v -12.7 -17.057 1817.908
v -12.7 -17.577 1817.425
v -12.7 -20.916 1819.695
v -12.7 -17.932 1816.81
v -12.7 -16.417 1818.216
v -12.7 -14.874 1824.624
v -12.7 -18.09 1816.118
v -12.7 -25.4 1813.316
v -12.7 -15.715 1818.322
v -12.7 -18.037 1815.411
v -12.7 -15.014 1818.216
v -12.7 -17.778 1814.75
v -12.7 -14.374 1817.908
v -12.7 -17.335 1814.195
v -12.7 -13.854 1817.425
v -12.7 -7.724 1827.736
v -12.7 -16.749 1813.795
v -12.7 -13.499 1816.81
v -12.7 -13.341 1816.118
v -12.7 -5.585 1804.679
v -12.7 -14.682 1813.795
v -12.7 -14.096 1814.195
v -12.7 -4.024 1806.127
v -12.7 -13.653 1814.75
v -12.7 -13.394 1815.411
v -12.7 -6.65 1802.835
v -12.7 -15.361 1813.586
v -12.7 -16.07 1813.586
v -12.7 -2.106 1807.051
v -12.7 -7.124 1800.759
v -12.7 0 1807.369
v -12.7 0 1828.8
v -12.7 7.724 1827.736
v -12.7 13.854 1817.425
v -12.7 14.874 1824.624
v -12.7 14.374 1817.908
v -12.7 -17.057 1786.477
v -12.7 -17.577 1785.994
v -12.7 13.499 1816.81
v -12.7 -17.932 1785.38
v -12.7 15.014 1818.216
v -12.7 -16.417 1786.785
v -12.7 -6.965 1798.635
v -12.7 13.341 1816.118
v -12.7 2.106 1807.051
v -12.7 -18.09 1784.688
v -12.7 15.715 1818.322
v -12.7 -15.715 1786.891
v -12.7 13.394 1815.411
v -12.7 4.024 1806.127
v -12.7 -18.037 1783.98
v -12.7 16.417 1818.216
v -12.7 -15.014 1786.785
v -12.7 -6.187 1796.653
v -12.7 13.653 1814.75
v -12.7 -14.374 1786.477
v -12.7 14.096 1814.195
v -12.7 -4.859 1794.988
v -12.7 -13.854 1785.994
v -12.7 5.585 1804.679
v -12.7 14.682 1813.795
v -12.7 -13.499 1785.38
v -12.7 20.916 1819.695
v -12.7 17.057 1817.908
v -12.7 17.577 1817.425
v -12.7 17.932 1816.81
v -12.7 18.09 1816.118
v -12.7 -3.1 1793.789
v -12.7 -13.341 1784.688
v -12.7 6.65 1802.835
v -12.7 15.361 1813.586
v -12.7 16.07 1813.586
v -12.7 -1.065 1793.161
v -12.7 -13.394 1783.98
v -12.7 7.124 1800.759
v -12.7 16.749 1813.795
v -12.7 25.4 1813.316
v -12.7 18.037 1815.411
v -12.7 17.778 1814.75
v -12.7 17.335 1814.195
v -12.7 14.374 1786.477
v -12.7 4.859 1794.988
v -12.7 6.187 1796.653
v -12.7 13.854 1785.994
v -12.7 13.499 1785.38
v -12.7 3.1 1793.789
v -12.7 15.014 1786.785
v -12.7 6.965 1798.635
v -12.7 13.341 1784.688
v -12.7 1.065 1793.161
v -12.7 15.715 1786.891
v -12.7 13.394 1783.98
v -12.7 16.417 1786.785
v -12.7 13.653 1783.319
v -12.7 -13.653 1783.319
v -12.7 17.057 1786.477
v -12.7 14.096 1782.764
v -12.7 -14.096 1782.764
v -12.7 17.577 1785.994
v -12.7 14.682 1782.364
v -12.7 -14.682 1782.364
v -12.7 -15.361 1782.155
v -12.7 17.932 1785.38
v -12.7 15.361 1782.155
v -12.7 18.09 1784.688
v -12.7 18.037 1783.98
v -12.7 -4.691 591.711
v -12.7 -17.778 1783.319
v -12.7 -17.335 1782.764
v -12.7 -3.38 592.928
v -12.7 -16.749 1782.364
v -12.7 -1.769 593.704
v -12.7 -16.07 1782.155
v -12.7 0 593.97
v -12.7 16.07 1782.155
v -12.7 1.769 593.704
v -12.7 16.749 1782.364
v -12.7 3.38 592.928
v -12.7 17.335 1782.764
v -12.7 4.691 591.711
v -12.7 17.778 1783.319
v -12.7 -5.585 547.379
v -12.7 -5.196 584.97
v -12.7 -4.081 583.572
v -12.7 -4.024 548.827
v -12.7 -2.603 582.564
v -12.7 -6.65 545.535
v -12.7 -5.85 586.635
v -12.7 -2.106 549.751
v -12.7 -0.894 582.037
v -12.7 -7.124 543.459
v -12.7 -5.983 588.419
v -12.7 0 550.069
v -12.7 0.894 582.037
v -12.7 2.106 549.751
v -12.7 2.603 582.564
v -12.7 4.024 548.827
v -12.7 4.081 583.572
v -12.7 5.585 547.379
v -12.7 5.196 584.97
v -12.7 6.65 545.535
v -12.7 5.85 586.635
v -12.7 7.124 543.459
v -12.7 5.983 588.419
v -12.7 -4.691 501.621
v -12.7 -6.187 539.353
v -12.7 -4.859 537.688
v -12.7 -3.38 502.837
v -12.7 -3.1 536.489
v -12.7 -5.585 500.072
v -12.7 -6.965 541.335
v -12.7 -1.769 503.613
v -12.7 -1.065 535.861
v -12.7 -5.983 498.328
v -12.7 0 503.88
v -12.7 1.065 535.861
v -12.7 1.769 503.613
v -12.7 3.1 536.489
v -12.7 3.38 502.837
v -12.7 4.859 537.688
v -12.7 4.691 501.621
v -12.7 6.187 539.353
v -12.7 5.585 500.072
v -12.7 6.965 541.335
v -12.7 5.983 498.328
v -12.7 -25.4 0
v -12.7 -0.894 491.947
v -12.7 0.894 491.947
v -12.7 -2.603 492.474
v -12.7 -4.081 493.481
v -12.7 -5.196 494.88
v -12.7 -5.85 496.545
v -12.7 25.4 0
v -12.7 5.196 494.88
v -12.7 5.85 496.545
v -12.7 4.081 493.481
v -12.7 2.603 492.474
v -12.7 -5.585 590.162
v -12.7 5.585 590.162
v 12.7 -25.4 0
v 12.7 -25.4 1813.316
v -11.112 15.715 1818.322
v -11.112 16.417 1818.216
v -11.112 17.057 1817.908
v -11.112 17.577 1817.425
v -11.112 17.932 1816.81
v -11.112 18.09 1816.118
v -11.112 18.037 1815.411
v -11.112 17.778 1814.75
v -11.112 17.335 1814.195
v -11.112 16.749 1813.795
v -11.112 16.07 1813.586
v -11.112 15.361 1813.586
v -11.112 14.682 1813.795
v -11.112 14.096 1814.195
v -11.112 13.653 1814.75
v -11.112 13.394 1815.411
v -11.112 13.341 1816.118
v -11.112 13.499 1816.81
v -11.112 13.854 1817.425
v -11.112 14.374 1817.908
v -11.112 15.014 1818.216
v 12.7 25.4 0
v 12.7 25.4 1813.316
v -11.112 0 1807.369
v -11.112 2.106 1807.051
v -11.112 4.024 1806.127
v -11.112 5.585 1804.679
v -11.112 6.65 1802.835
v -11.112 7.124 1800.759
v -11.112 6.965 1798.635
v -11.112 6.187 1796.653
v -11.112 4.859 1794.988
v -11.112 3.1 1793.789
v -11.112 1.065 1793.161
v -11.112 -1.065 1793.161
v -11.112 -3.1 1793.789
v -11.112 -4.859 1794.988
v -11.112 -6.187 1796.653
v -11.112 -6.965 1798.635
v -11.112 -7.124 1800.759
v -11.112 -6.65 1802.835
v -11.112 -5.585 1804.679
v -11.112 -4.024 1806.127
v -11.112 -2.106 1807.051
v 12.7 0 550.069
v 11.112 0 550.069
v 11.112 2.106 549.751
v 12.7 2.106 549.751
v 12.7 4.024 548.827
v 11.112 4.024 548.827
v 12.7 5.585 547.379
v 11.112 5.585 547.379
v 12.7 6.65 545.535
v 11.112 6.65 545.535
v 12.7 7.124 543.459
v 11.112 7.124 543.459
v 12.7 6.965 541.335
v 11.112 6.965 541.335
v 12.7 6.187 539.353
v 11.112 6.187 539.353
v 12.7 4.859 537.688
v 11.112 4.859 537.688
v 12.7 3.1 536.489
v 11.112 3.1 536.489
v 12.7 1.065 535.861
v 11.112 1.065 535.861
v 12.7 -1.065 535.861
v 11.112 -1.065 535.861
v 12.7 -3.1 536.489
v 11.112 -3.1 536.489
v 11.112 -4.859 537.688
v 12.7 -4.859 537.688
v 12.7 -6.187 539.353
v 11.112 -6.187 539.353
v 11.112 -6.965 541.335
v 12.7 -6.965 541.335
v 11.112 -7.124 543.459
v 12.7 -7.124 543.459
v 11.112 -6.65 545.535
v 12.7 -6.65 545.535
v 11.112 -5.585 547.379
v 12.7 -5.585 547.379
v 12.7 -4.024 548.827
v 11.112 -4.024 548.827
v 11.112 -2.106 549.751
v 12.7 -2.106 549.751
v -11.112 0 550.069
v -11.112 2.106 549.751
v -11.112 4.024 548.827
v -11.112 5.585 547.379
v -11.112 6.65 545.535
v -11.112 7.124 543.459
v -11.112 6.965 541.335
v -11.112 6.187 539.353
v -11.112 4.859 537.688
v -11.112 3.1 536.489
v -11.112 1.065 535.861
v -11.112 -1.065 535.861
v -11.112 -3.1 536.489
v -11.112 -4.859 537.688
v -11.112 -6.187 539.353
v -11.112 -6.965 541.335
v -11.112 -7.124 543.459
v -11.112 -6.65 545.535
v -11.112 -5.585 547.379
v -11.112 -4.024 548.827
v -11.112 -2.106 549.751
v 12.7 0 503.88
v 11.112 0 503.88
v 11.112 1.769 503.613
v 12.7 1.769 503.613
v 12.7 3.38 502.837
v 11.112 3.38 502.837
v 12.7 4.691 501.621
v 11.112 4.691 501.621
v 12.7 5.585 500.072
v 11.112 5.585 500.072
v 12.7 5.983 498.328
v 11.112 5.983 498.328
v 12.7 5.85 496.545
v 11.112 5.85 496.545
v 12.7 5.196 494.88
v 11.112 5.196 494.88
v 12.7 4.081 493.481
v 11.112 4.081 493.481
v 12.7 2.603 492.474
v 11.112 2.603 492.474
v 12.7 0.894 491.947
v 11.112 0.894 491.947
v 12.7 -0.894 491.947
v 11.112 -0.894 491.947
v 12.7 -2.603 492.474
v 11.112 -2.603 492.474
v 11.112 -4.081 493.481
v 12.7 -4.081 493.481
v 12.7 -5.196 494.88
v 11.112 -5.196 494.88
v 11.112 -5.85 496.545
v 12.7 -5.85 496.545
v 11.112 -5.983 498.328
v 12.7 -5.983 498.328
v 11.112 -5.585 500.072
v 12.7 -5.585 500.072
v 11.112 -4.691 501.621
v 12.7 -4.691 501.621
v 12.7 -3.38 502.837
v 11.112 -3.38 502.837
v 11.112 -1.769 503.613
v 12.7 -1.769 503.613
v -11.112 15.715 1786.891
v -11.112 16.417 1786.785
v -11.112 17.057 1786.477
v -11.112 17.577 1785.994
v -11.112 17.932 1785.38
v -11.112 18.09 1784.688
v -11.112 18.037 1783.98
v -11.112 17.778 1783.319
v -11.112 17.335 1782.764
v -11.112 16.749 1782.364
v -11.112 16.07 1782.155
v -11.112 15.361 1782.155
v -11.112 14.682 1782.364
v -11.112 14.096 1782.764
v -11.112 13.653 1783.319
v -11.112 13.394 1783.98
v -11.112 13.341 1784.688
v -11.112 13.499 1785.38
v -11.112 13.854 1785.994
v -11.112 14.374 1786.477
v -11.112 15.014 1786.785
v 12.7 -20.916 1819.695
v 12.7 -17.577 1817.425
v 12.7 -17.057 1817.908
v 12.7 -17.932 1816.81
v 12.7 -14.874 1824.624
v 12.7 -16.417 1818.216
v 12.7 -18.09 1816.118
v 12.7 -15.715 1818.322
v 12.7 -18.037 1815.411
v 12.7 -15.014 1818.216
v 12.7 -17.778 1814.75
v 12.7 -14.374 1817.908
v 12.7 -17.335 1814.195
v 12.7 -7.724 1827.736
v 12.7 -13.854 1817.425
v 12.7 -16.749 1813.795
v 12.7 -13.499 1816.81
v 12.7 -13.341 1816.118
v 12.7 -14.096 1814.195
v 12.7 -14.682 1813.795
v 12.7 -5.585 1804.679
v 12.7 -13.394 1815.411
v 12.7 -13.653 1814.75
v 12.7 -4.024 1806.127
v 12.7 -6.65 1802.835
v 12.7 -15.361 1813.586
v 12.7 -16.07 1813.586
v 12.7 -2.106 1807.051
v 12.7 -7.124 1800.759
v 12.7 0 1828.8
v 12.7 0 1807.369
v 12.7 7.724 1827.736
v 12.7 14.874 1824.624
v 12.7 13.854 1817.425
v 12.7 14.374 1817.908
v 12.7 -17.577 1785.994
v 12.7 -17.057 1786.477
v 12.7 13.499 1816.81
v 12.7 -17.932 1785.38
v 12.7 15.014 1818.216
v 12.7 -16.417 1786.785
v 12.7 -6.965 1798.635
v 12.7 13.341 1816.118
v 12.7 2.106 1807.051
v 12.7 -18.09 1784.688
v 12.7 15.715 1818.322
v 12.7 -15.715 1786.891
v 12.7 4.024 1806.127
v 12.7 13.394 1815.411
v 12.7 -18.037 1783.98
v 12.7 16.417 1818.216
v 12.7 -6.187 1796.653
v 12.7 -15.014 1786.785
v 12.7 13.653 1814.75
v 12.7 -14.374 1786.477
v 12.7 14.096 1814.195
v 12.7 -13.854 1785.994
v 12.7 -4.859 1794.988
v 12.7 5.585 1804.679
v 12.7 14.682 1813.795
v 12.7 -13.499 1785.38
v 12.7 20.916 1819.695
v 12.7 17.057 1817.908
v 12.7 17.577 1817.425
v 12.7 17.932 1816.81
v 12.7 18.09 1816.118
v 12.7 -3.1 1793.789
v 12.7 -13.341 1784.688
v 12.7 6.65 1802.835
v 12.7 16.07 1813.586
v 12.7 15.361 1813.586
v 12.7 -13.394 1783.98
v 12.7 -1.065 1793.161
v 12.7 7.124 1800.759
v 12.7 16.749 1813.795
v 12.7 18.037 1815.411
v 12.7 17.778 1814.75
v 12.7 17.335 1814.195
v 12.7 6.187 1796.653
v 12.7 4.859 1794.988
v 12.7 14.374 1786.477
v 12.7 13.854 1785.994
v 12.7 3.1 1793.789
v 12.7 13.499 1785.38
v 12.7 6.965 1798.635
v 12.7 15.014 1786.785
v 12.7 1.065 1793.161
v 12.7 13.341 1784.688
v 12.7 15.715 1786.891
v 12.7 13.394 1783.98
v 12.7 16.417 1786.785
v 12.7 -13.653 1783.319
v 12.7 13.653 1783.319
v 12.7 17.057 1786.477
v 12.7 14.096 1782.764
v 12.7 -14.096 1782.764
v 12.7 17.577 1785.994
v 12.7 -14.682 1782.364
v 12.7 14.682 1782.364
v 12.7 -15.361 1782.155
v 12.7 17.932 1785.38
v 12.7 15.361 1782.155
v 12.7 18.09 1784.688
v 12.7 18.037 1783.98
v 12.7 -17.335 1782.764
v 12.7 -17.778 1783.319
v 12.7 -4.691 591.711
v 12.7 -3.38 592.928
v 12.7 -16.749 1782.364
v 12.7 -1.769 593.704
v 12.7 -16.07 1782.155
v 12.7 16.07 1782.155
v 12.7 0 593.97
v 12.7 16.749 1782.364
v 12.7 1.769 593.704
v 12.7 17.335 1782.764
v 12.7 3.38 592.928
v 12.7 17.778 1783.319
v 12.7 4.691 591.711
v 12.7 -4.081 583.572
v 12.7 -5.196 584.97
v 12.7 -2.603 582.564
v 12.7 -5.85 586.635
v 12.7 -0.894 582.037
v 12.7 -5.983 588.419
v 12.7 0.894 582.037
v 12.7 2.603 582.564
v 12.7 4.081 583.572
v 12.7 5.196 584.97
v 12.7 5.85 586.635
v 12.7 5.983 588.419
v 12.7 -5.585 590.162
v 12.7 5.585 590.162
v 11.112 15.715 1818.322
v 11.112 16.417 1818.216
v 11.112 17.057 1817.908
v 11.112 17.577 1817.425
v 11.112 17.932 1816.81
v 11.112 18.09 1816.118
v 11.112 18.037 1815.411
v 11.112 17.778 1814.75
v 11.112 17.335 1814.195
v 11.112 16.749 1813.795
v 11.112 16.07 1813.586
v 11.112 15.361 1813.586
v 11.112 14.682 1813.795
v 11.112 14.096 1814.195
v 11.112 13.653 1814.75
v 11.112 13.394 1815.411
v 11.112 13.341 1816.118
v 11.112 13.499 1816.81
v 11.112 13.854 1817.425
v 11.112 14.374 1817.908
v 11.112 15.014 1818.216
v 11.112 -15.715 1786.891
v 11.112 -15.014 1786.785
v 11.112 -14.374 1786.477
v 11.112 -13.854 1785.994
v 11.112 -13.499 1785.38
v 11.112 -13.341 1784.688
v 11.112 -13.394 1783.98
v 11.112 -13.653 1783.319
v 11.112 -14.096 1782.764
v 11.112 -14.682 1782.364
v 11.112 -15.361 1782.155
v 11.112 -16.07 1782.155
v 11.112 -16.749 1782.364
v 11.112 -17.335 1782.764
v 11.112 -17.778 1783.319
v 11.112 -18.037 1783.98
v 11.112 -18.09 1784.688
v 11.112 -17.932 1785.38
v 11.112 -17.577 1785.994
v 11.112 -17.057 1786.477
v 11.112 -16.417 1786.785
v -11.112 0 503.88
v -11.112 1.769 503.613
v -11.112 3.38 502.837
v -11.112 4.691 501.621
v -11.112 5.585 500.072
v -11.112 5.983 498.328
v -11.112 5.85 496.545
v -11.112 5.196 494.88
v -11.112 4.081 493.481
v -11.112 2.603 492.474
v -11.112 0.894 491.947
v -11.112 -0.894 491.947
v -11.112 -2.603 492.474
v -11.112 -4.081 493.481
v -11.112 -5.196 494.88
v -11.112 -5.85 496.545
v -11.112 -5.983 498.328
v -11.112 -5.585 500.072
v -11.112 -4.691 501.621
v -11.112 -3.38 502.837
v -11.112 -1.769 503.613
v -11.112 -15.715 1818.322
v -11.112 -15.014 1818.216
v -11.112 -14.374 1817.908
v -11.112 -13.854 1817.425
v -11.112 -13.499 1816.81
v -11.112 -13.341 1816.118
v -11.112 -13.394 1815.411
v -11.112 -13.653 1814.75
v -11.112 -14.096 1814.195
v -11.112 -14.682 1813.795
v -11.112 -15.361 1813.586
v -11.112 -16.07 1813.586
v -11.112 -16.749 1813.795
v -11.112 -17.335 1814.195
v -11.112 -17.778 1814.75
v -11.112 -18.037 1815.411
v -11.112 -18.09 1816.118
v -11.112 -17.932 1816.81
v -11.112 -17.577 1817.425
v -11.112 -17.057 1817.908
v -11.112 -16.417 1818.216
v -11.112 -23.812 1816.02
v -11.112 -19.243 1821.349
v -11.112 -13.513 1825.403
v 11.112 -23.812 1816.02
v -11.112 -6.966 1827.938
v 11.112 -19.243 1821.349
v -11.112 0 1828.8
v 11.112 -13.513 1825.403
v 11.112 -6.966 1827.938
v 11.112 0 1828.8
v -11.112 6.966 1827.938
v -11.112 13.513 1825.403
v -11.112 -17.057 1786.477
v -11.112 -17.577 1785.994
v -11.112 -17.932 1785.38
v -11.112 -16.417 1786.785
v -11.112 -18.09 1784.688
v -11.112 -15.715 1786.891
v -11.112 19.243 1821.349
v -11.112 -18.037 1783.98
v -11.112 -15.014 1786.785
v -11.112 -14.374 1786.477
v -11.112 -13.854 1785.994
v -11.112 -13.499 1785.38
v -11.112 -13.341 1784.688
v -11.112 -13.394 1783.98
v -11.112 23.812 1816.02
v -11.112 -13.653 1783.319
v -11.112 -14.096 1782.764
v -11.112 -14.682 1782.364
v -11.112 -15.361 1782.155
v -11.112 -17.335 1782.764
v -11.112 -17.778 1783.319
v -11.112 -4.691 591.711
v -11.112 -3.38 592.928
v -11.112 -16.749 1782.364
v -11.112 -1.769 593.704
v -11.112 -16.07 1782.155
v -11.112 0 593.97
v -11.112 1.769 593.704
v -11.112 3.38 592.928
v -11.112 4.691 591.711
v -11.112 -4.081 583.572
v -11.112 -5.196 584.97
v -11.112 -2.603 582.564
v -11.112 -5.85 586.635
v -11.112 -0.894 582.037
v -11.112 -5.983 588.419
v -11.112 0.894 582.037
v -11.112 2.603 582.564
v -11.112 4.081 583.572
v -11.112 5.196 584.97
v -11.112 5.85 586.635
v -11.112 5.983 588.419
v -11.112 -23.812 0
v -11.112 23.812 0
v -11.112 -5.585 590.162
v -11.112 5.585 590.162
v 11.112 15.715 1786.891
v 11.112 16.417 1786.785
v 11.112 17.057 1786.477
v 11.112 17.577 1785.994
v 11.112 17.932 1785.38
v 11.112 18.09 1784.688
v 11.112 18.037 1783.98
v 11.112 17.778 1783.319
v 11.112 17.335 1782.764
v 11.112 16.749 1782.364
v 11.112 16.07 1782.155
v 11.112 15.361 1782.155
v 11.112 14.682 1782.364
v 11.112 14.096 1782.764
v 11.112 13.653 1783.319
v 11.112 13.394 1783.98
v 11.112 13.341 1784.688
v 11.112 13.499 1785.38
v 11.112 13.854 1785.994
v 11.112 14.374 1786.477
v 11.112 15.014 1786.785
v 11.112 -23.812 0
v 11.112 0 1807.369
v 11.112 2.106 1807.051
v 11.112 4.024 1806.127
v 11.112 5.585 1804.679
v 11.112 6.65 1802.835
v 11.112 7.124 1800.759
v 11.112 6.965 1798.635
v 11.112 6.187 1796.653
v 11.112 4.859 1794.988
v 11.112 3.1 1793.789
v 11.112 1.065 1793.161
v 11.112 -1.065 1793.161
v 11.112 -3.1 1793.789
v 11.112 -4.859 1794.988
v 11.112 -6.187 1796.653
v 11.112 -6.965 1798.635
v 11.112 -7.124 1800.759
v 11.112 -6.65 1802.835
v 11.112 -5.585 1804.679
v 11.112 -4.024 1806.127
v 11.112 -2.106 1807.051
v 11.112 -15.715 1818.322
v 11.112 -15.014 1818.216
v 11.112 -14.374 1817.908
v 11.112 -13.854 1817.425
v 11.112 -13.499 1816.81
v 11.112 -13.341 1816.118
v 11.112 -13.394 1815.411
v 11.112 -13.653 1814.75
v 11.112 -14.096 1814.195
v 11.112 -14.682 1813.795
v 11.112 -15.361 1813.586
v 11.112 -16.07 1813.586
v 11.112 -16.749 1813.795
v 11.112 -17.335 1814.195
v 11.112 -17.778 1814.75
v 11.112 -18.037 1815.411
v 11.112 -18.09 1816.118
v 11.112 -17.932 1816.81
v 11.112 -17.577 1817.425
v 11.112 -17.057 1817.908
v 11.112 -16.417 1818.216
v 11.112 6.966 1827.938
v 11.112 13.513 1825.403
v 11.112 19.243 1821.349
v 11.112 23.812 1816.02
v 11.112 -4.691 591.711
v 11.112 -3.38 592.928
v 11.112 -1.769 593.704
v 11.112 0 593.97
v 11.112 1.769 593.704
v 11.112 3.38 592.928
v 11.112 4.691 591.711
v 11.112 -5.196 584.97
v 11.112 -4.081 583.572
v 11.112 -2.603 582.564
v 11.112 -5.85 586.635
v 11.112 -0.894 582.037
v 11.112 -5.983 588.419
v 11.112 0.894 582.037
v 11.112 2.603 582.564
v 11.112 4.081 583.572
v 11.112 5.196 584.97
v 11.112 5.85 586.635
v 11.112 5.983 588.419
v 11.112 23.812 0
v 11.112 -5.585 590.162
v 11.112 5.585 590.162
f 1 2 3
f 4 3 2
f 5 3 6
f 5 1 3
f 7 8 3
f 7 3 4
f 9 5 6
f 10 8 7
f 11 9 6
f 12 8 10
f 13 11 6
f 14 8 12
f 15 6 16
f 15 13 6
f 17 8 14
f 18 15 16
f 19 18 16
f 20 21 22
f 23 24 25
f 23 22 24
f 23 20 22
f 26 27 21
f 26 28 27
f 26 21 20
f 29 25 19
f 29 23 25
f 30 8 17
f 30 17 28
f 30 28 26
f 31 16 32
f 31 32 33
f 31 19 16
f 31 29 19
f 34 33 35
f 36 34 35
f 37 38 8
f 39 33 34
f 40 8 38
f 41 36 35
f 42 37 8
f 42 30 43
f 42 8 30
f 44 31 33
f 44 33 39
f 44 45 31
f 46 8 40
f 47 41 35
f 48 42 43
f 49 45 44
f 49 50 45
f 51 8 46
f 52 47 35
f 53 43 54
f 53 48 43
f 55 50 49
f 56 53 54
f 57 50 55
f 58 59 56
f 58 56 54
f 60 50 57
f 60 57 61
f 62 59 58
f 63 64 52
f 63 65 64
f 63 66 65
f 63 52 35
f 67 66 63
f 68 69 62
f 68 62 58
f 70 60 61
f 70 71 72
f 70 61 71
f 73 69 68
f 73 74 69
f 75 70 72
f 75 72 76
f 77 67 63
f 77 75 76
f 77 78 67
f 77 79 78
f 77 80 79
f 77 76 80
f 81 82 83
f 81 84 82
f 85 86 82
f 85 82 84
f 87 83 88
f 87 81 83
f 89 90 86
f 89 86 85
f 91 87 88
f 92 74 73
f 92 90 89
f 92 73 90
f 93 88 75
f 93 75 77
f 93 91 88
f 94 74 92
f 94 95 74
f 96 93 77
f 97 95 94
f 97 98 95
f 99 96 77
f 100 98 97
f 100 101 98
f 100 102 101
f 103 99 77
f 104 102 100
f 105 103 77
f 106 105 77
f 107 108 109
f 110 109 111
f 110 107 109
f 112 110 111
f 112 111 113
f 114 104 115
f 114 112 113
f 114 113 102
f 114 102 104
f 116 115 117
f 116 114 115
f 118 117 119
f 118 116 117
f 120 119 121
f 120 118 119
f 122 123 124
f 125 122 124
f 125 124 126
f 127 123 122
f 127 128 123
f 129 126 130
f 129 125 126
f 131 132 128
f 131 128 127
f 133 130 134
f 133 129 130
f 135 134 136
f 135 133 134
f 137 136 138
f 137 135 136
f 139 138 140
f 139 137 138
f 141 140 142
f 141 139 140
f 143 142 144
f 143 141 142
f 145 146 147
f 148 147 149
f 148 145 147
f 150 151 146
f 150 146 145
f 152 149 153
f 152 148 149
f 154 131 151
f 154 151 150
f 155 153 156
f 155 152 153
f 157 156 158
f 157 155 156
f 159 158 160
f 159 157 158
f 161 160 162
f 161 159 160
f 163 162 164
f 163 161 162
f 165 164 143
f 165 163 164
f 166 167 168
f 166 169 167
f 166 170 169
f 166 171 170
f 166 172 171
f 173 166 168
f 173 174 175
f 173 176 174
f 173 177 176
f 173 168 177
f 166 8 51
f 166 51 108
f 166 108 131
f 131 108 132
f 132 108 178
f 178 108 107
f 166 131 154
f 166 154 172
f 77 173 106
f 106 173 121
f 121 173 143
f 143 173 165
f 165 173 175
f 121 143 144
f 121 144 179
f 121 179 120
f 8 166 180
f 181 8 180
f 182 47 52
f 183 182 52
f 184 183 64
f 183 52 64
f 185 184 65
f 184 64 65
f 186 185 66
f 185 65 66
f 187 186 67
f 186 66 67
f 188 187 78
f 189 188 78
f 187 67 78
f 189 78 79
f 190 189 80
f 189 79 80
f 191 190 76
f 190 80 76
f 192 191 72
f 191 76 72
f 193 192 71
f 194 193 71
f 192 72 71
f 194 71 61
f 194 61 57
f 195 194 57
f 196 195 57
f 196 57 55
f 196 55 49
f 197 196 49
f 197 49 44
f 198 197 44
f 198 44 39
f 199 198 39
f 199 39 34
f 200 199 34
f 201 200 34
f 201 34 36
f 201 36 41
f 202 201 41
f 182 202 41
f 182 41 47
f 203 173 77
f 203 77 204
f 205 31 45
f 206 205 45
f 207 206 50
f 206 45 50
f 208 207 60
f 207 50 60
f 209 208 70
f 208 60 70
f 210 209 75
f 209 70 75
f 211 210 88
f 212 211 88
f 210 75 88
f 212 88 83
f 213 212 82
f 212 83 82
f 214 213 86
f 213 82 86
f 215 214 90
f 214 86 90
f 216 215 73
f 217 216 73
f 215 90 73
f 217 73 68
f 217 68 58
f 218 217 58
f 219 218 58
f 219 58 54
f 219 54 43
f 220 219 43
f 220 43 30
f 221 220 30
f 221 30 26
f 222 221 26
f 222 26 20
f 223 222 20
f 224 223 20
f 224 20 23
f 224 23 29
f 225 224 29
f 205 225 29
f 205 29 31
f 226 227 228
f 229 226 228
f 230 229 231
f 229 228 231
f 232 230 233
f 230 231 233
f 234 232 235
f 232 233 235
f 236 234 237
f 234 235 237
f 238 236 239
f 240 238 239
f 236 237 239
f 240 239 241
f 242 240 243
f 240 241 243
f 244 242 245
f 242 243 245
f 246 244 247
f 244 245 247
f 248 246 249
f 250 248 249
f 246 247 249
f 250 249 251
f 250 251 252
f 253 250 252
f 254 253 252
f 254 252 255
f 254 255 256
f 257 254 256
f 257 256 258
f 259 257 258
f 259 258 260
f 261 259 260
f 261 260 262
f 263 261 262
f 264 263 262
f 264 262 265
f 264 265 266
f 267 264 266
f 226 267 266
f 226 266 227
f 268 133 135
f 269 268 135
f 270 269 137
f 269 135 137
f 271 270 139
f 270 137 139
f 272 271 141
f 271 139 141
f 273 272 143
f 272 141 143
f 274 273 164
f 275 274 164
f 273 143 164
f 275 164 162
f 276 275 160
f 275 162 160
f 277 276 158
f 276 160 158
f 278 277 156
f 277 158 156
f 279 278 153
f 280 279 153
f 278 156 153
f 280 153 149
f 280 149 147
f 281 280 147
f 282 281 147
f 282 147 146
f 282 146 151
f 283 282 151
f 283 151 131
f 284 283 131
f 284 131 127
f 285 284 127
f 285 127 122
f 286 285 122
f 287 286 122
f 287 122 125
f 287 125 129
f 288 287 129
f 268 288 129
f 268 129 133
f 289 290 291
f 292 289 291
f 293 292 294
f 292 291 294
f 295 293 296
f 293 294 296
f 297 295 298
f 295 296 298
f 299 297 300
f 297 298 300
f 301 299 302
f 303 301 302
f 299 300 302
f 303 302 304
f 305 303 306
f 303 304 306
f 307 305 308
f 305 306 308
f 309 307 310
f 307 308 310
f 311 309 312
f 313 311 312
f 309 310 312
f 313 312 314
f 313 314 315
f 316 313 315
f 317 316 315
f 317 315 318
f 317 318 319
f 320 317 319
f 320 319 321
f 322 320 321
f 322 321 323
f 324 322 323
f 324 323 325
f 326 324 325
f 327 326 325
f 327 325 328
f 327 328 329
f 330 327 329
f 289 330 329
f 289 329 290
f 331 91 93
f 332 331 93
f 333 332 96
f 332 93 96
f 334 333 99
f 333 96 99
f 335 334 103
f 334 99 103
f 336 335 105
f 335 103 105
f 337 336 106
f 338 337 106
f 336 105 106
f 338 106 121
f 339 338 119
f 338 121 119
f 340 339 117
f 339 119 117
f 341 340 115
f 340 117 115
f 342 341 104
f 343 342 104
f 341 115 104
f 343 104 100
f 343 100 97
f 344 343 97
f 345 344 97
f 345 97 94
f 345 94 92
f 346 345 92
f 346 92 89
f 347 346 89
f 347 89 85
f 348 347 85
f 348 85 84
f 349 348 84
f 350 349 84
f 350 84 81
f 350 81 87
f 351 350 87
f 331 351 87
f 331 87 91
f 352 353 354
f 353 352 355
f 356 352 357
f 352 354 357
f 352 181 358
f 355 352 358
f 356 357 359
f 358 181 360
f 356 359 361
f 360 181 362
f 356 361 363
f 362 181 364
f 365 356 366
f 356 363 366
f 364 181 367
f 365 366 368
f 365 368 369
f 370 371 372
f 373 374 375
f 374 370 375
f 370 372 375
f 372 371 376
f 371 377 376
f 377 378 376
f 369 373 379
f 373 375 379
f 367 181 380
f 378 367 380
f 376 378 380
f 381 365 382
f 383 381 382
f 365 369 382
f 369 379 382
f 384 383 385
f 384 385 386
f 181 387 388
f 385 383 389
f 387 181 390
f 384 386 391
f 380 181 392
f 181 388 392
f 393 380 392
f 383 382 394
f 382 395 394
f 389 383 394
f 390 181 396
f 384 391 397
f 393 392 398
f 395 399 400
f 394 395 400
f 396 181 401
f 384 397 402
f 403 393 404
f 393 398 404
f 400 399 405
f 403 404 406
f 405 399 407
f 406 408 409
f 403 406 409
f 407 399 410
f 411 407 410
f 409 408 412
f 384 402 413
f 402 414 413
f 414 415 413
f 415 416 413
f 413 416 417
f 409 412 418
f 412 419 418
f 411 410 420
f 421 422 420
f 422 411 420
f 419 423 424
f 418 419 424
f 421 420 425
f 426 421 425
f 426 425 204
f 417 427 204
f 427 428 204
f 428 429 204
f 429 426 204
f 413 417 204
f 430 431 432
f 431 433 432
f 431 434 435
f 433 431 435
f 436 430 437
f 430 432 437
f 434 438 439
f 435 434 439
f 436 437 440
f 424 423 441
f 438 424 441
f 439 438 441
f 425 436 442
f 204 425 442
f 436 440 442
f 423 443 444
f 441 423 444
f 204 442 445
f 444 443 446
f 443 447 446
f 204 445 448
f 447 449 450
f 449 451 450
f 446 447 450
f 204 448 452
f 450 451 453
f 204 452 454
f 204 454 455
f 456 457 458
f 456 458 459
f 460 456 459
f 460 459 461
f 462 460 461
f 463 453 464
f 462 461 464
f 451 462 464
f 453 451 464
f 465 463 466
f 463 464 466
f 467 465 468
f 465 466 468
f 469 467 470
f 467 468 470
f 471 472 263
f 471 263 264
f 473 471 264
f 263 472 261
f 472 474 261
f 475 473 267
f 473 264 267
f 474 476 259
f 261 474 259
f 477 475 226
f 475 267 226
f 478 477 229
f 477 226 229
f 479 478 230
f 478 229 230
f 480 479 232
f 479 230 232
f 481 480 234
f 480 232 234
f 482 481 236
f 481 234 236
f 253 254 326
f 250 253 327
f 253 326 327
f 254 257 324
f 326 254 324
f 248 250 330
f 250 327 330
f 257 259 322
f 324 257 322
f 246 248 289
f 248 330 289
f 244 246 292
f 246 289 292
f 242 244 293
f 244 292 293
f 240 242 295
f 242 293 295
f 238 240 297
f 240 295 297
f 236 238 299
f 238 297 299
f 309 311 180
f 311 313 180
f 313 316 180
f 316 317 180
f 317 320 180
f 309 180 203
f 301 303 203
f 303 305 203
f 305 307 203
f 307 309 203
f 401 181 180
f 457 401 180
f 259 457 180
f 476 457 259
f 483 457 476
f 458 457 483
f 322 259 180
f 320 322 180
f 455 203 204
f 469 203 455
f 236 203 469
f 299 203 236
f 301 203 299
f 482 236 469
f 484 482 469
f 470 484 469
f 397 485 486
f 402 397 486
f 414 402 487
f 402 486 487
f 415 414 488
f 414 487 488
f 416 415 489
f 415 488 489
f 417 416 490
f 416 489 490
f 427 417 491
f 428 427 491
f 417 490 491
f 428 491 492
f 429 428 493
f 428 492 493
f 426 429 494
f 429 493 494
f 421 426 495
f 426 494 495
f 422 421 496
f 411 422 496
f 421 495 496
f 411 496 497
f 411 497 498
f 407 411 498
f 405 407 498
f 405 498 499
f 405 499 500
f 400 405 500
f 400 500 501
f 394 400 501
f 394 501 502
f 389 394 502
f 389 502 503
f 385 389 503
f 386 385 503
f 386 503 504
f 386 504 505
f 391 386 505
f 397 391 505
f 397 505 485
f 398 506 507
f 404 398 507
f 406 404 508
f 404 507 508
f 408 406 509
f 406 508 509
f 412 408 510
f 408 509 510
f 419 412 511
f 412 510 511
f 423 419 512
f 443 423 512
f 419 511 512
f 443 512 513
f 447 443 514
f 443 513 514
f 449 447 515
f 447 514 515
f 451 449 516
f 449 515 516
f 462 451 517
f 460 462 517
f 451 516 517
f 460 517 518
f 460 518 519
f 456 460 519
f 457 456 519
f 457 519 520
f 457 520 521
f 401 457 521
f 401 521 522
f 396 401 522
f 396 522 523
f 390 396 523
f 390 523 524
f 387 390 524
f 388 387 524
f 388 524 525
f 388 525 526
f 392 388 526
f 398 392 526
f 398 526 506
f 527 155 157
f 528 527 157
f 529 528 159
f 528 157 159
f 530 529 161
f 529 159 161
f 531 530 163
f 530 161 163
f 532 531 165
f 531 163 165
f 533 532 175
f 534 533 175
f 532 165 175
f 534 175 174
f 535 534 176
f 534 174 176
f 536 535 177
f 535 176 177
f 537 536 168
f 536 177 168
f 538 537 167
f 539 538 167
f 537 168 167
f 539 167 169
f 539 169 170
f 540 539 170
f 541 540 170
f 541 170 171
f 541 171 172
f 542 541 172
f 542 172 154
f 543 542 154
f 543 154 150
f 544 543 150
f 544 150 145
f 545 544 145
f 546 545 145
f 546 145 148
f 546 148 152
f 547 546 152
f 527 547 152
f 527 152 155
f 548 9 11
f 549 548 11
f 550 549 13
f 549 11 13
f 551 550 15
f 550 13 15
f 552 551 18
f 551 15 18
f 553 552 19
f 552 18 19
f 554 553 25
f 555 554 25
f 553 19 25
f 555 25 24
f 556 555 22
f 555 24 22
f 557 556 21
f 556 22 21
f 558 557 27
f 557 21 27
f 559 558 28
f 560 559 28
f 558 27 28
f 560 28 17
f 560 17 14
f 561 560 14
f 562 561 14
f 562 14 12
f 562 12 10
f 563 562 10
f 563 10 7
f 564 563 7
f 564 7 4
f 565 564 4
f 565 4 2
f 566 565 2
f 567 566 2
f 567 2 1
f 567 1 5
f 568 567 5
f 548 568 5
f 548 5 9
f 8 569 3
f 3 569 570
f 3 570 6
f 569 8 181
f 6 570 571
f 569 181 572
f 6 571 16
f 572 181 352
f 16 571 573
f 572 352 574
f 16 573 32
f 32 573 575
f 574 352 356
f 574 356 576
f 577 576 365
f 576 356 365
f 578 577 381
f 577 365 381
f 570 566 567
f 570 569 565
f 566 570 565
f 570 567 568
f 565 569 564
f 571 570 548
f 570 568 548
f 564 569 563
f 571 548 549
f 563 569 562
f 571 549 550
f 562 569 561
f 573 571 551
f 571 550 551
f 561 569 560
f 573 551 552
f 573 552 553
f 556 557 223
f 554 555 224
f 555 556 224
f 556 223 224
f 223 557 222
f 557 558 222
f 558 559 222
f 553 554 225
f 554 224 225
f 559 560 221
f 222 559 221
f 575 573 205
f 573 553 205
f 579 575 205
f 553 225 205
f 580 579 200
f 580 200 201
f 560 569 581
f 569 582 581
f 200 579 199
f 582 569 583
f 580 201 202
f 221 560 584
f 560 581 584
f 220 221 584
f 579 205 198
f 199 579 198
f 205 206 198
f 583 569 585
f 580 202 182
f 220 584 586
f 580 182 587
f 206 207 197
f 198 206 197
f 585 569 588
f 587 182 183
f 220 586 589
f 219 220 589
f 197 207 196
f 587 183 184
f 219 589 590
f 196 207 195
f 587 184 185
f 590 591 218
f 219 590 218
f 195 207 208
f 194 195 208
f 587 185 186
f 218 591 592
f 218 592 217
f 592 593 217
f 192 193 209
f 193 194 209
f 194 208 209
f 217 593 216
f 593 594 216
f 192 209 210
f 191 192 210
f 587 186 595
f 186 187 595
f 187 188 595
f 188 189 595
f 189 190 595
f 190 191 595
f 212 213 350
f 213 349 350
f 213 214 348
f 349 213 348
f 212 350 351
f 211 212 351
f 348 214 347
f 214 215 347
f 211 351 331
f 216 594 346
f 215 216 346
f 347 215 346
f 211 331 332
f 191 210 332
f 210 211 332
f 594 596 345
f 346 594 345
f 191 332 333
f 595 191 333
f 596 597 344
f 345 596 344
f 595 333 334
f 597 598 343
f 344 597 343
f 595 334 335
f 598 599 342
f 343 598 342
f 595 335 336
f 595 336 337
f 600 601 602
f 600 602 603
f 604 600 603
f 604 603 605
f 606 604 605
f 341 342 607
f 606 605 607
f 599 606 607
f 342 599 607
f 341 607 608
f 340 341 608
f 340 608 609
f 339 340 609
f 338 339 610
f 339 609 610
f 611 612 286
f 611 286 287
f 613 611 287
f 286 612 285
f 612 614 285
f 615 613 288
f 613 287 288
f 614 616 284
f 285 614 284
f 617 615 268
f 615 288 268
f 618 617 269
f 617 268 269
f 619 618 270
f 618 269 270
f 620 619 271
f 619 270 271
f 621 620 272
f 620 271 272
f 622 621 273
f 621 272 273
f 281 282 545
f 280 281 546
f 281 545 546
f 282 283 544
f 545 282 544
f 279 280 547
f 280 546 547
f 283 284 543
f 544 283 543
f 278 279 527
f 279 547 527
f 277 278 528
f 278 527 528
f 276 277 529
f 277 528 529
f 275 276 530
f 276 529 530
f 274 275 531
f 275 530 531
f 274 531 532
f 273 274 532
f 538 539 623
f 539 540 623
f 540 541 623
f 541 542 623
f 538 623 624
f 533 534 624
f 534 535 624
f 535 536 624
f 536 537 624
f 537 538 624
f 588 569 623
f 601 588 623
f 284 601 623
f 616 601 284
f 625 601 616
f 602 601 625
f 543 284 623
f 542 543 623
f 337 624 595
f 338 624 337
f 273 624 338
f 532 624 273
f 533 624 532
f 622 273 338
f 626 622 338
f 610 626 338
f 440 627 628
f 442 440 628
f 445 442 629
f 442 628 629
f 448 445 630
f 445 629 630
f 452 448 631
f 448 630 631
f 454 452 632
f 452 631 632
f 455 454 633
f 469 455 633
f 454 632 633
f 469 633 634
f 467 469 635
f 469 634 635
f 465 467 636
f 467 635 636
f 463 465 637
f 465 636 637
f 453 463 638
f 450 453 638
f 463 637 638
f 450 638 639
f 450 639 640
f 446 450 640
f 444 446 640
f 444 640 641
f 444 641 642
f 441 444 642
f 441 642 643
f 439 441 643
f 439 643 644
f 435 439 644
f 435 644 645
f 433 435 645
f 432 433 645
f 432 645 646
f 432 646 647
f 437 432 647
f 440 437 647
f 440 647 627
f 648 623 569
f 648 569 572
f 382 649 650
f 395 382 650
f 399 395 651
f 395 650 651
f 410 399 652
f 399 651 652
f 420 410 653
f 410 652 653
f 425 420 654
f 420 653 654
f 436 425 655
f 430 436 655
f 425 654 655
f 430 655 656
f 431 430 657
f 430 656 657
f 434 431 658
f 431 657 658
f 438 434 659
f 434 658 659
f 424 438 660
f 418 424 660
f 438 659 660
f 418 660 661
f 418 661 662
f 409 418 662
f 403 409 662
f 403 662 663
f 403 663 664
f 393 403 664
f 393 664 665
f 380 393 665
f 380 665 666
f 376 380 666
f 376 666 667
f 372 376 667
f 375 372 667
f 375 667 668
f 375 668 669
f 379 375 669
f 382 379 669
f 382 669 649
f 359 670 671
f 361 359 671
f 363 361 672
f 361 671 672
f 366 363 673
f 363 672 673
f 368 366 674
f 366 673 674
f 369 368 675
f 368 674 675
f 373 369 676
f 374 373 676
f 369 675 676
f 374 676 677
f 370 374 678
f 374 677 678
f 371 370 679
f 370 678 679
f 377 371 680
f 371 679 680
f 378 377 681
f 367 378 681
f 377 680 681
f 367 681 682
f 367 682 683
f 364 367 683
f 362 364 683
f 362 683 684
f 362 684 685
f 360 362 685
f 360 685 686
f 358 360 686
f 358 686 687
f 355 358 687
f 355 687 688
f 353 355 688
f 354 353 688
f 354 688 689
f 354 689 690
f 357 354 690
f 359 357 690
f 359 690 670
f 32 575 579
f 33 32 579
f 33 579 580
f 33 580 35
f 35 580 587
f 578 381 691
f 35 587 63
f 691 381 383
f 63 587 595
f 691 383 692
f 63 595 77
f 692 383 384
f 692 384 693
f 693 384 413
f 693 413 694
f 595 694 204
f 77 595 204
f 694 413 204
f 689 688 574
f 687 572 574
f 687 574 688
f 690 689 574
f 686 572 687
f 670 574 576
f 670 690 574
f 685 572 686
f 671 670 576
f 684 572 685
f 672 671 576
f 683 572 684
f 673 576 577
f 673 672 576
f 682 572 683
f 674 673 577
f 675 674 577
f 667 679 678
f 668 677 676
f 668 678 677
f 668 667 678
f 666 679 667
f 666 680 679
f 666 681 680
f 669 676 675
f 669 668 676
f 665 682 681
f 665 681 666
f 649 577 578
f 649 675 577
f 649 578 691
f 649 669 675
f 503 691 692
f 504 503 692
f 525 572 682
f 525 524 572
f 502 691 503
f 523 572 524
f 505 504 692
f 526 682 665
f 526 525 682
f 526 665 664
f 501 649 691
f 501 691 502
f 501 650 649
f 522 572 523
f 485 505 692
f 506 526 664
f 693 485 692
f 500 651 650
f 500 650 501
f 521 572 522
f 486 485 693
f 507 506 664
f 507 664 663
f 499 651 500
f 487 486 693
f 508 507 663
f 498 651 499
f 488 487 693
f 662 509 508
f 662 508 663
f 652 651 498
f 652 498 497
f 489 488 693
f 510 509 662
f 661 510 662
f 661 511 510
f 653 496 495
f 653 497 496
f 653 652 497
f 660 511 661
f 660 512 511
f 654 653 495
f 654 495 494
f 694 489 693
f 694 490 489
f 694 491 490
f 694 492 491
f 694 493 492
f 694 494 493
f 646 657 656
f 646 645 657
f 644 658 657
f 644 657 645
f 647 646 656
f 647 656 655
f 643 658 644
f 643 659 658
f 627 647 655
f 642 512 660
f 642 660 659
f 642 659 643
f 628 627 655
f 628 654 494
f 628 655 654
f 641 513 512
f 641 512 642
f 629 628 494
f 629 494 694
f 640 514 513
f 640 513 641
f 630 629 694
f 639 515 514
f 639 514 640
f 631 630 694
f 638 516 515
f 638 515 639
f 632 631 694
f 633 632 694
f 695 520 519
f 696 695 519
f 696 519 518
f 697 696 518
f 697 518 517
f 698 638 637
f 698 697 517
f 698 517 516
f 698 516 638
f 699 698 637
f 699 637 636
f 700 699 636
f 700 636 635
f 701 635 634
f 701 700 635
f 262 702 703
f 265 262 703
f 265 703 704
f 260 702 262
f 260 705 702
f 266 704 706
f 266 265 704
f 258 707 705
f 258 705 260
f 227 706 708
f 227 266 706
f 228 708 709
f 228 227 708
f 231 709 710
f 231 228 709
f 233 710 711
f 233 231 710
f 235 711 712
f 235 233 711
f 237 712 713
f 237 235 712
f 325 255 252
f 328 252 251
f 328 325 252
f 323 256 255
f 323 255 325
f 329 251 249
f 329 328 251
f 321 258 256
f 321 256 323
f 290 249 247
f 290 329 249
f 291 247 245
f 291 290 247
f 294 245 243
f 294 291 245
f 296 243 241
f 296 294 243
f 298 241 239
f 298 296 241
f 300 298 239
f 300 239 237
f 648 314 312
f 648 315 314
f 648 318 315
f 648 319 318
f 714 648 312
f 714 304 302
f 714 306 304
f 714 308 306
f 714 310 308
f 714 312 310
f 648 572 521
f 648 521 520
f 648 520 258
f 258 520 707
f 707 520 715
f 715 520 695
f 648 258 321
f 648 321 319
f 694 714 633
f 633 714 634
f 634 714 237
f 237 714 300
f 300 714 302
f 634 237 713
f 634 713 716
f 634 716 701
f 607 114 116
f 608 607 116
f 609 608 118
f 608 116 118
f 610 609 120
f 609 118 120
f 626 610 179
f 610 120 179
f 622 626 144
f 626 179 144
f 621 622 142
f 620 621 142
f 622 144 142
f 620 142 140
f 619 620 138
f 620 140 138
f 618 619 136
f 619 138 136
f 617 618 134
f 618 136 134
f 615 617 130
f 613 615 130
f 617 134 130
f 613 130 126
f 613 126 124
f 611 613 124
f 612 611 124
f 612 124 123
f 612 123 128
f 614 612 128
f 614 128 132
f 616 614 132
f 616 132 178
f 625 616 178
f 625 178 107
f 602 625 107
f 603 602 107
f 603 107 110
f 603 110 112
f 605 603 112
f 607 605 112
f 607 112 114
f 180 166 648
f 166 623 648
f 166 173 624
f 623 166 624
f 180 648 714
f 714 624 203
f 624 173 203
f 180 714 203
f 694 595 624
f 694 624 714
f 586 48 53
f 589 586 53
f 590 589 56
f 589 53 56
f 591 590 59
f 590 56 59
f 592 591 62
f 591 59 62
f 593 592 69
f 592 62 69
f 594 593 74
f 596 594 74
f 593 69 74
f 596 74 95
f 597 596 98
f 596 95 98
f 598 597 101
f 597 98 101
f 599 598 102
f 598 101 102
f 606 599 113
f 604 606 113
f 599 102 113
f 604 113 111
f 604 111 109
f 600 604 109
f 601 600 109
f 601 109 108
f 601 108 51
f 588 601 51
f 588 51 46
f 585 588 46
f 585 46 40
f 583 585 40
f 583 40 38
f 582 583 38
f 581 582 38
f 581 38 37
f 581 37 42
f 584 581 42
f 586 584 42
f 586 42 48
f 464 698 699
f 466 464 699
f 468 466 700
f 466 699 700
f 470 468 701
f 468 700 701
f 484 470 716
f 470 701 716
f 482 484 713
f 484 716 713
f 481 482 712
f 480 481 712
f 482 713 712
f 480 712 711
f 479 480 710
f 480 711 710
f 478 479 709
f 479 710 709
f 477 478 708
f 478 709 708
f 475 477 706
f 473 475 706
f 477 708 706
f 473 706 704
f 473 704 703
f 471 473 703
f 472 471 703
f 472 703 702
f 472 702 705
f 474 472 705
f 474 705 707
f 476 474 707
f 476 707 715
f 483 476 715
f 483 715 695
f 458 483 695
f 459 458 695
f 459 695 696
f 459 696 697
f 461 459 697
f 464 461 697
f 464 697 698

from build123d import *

# Parameters (mm, degrees)
SKETCH2_W                      = 25.4
SKETCH2_H                      = 50.8
SKETCH2_W_2                    = 22.225
SKETCH2_H_2                    = 47.625
EXTRUDE_THIN2_DEPTH            = 1828.8
CUT_EXTRUDE1_DEPTH             = 26.4
F_9_16_0_5625_DIAMETER_HOLE1_D = 14.2875
F_9_16_0_5625_DIAMETER_HOLE2_D = 14.2875
F_12_0MM_DOWEL_HOLE1_D         = 12
F_3_16_0_1875_DIAMETER_HOLE1_D = 4.7625


with BuildPart() as part:
    # Sketch2 → Extrude-Thin2 (new body)
    with BuildSketch(Plane.XY):
        Rectangle(SKETCH2_W, SKETCH2_H)
        Rectangle(SKETCH2_W_2, SKETCH2_H_2, mode=Mode.SUBTRACT)
    extrude(amount=EXTRUDE_THIN2_DEPTH)

    # Sketch8 → Cut-Extrude1 (cut, through all)
    with BuildSketch(Plane(origin=(12.7, 0, 0), x_dir=(0, 0, -1), z_dir=(1, 0, 0))):
        with BuildLine():
            Line((-1828.8, 25.4), (-1828.8, -3.09e-07))
            ThreePointArc((-1828.8, -3.09e-07), (-1824.623790622, 14.87379041), (-1813.315860361, 25.4))
            Line((-1813.315860361, 25.4), (-1828.8, 25.4))
        make_face()
        with BuildLine():
            Line((-1828.8, -25.4), (-1813.315860361, -25.4))
            ThreePointArc((-1813.315860361, -25.4), (-1824.623790462, -14.873790674), (-1828.8, -3.09e-07))
            Line((-1828.8, -3.09e-07), (-1828.8, -25.4))
        make_face()
    extrude(amount=-CUT_EXTRUDE1_DEPTH, mode=Mode.SUBTRACT)

    # 9/16 (0.5625) Diameter Hole1 (through all)
    with Locations(Plane(origin=(12.7, 0, 0), x_dir=(0, 0, -1), z_dir=(1, 0, 0))):
        with Locations((-1800.225, 0)):
            Hole(F_9_16_0_5625_DIAMETER_HOLE1_D / 2)

    # 9/16 (0.5625) Diameter Hole2 (through all)
    with Locations(Plane(origin=(12.7, 0, 0), x_dir=(0, 0, -1), z_dir=(1, 0, 0))):
        with Locations((-542.925, 0)):
            Hole(F_9_16_0_5625_DIAMETER_HOLE2_D / 2)

    # Ø12.0mm Dowel Hole1 (through all)
    with Locations(Plane(origin=(12.7, 0, 0), x_dir=(0, 0, -1), z_dir=(1, 0, 0))):
        with Locations((-587.9703125, 0), (-497.8796875, 0)):
            Hole(F_12_0MM_DOWEL_HOLE1_D / 2)

    # 3/16 (0.1875) Diameter Hole1 (through all)
    with Locations(Plane(origin=(12.7, 0, 0), x_dir=(0, 0, -1), z_dir=(1, 0, 0))):
        with Locations((-1784.509551788, 15.715448212), (-1784.509551788, -15.715448212), (-1815.940448212, -15.715448212), (-1815.940448212, 15.715448212)):
            Hole(F_3_16_0_1875_DIAMETER_HOLE1_D / 2)


solid = part.part
